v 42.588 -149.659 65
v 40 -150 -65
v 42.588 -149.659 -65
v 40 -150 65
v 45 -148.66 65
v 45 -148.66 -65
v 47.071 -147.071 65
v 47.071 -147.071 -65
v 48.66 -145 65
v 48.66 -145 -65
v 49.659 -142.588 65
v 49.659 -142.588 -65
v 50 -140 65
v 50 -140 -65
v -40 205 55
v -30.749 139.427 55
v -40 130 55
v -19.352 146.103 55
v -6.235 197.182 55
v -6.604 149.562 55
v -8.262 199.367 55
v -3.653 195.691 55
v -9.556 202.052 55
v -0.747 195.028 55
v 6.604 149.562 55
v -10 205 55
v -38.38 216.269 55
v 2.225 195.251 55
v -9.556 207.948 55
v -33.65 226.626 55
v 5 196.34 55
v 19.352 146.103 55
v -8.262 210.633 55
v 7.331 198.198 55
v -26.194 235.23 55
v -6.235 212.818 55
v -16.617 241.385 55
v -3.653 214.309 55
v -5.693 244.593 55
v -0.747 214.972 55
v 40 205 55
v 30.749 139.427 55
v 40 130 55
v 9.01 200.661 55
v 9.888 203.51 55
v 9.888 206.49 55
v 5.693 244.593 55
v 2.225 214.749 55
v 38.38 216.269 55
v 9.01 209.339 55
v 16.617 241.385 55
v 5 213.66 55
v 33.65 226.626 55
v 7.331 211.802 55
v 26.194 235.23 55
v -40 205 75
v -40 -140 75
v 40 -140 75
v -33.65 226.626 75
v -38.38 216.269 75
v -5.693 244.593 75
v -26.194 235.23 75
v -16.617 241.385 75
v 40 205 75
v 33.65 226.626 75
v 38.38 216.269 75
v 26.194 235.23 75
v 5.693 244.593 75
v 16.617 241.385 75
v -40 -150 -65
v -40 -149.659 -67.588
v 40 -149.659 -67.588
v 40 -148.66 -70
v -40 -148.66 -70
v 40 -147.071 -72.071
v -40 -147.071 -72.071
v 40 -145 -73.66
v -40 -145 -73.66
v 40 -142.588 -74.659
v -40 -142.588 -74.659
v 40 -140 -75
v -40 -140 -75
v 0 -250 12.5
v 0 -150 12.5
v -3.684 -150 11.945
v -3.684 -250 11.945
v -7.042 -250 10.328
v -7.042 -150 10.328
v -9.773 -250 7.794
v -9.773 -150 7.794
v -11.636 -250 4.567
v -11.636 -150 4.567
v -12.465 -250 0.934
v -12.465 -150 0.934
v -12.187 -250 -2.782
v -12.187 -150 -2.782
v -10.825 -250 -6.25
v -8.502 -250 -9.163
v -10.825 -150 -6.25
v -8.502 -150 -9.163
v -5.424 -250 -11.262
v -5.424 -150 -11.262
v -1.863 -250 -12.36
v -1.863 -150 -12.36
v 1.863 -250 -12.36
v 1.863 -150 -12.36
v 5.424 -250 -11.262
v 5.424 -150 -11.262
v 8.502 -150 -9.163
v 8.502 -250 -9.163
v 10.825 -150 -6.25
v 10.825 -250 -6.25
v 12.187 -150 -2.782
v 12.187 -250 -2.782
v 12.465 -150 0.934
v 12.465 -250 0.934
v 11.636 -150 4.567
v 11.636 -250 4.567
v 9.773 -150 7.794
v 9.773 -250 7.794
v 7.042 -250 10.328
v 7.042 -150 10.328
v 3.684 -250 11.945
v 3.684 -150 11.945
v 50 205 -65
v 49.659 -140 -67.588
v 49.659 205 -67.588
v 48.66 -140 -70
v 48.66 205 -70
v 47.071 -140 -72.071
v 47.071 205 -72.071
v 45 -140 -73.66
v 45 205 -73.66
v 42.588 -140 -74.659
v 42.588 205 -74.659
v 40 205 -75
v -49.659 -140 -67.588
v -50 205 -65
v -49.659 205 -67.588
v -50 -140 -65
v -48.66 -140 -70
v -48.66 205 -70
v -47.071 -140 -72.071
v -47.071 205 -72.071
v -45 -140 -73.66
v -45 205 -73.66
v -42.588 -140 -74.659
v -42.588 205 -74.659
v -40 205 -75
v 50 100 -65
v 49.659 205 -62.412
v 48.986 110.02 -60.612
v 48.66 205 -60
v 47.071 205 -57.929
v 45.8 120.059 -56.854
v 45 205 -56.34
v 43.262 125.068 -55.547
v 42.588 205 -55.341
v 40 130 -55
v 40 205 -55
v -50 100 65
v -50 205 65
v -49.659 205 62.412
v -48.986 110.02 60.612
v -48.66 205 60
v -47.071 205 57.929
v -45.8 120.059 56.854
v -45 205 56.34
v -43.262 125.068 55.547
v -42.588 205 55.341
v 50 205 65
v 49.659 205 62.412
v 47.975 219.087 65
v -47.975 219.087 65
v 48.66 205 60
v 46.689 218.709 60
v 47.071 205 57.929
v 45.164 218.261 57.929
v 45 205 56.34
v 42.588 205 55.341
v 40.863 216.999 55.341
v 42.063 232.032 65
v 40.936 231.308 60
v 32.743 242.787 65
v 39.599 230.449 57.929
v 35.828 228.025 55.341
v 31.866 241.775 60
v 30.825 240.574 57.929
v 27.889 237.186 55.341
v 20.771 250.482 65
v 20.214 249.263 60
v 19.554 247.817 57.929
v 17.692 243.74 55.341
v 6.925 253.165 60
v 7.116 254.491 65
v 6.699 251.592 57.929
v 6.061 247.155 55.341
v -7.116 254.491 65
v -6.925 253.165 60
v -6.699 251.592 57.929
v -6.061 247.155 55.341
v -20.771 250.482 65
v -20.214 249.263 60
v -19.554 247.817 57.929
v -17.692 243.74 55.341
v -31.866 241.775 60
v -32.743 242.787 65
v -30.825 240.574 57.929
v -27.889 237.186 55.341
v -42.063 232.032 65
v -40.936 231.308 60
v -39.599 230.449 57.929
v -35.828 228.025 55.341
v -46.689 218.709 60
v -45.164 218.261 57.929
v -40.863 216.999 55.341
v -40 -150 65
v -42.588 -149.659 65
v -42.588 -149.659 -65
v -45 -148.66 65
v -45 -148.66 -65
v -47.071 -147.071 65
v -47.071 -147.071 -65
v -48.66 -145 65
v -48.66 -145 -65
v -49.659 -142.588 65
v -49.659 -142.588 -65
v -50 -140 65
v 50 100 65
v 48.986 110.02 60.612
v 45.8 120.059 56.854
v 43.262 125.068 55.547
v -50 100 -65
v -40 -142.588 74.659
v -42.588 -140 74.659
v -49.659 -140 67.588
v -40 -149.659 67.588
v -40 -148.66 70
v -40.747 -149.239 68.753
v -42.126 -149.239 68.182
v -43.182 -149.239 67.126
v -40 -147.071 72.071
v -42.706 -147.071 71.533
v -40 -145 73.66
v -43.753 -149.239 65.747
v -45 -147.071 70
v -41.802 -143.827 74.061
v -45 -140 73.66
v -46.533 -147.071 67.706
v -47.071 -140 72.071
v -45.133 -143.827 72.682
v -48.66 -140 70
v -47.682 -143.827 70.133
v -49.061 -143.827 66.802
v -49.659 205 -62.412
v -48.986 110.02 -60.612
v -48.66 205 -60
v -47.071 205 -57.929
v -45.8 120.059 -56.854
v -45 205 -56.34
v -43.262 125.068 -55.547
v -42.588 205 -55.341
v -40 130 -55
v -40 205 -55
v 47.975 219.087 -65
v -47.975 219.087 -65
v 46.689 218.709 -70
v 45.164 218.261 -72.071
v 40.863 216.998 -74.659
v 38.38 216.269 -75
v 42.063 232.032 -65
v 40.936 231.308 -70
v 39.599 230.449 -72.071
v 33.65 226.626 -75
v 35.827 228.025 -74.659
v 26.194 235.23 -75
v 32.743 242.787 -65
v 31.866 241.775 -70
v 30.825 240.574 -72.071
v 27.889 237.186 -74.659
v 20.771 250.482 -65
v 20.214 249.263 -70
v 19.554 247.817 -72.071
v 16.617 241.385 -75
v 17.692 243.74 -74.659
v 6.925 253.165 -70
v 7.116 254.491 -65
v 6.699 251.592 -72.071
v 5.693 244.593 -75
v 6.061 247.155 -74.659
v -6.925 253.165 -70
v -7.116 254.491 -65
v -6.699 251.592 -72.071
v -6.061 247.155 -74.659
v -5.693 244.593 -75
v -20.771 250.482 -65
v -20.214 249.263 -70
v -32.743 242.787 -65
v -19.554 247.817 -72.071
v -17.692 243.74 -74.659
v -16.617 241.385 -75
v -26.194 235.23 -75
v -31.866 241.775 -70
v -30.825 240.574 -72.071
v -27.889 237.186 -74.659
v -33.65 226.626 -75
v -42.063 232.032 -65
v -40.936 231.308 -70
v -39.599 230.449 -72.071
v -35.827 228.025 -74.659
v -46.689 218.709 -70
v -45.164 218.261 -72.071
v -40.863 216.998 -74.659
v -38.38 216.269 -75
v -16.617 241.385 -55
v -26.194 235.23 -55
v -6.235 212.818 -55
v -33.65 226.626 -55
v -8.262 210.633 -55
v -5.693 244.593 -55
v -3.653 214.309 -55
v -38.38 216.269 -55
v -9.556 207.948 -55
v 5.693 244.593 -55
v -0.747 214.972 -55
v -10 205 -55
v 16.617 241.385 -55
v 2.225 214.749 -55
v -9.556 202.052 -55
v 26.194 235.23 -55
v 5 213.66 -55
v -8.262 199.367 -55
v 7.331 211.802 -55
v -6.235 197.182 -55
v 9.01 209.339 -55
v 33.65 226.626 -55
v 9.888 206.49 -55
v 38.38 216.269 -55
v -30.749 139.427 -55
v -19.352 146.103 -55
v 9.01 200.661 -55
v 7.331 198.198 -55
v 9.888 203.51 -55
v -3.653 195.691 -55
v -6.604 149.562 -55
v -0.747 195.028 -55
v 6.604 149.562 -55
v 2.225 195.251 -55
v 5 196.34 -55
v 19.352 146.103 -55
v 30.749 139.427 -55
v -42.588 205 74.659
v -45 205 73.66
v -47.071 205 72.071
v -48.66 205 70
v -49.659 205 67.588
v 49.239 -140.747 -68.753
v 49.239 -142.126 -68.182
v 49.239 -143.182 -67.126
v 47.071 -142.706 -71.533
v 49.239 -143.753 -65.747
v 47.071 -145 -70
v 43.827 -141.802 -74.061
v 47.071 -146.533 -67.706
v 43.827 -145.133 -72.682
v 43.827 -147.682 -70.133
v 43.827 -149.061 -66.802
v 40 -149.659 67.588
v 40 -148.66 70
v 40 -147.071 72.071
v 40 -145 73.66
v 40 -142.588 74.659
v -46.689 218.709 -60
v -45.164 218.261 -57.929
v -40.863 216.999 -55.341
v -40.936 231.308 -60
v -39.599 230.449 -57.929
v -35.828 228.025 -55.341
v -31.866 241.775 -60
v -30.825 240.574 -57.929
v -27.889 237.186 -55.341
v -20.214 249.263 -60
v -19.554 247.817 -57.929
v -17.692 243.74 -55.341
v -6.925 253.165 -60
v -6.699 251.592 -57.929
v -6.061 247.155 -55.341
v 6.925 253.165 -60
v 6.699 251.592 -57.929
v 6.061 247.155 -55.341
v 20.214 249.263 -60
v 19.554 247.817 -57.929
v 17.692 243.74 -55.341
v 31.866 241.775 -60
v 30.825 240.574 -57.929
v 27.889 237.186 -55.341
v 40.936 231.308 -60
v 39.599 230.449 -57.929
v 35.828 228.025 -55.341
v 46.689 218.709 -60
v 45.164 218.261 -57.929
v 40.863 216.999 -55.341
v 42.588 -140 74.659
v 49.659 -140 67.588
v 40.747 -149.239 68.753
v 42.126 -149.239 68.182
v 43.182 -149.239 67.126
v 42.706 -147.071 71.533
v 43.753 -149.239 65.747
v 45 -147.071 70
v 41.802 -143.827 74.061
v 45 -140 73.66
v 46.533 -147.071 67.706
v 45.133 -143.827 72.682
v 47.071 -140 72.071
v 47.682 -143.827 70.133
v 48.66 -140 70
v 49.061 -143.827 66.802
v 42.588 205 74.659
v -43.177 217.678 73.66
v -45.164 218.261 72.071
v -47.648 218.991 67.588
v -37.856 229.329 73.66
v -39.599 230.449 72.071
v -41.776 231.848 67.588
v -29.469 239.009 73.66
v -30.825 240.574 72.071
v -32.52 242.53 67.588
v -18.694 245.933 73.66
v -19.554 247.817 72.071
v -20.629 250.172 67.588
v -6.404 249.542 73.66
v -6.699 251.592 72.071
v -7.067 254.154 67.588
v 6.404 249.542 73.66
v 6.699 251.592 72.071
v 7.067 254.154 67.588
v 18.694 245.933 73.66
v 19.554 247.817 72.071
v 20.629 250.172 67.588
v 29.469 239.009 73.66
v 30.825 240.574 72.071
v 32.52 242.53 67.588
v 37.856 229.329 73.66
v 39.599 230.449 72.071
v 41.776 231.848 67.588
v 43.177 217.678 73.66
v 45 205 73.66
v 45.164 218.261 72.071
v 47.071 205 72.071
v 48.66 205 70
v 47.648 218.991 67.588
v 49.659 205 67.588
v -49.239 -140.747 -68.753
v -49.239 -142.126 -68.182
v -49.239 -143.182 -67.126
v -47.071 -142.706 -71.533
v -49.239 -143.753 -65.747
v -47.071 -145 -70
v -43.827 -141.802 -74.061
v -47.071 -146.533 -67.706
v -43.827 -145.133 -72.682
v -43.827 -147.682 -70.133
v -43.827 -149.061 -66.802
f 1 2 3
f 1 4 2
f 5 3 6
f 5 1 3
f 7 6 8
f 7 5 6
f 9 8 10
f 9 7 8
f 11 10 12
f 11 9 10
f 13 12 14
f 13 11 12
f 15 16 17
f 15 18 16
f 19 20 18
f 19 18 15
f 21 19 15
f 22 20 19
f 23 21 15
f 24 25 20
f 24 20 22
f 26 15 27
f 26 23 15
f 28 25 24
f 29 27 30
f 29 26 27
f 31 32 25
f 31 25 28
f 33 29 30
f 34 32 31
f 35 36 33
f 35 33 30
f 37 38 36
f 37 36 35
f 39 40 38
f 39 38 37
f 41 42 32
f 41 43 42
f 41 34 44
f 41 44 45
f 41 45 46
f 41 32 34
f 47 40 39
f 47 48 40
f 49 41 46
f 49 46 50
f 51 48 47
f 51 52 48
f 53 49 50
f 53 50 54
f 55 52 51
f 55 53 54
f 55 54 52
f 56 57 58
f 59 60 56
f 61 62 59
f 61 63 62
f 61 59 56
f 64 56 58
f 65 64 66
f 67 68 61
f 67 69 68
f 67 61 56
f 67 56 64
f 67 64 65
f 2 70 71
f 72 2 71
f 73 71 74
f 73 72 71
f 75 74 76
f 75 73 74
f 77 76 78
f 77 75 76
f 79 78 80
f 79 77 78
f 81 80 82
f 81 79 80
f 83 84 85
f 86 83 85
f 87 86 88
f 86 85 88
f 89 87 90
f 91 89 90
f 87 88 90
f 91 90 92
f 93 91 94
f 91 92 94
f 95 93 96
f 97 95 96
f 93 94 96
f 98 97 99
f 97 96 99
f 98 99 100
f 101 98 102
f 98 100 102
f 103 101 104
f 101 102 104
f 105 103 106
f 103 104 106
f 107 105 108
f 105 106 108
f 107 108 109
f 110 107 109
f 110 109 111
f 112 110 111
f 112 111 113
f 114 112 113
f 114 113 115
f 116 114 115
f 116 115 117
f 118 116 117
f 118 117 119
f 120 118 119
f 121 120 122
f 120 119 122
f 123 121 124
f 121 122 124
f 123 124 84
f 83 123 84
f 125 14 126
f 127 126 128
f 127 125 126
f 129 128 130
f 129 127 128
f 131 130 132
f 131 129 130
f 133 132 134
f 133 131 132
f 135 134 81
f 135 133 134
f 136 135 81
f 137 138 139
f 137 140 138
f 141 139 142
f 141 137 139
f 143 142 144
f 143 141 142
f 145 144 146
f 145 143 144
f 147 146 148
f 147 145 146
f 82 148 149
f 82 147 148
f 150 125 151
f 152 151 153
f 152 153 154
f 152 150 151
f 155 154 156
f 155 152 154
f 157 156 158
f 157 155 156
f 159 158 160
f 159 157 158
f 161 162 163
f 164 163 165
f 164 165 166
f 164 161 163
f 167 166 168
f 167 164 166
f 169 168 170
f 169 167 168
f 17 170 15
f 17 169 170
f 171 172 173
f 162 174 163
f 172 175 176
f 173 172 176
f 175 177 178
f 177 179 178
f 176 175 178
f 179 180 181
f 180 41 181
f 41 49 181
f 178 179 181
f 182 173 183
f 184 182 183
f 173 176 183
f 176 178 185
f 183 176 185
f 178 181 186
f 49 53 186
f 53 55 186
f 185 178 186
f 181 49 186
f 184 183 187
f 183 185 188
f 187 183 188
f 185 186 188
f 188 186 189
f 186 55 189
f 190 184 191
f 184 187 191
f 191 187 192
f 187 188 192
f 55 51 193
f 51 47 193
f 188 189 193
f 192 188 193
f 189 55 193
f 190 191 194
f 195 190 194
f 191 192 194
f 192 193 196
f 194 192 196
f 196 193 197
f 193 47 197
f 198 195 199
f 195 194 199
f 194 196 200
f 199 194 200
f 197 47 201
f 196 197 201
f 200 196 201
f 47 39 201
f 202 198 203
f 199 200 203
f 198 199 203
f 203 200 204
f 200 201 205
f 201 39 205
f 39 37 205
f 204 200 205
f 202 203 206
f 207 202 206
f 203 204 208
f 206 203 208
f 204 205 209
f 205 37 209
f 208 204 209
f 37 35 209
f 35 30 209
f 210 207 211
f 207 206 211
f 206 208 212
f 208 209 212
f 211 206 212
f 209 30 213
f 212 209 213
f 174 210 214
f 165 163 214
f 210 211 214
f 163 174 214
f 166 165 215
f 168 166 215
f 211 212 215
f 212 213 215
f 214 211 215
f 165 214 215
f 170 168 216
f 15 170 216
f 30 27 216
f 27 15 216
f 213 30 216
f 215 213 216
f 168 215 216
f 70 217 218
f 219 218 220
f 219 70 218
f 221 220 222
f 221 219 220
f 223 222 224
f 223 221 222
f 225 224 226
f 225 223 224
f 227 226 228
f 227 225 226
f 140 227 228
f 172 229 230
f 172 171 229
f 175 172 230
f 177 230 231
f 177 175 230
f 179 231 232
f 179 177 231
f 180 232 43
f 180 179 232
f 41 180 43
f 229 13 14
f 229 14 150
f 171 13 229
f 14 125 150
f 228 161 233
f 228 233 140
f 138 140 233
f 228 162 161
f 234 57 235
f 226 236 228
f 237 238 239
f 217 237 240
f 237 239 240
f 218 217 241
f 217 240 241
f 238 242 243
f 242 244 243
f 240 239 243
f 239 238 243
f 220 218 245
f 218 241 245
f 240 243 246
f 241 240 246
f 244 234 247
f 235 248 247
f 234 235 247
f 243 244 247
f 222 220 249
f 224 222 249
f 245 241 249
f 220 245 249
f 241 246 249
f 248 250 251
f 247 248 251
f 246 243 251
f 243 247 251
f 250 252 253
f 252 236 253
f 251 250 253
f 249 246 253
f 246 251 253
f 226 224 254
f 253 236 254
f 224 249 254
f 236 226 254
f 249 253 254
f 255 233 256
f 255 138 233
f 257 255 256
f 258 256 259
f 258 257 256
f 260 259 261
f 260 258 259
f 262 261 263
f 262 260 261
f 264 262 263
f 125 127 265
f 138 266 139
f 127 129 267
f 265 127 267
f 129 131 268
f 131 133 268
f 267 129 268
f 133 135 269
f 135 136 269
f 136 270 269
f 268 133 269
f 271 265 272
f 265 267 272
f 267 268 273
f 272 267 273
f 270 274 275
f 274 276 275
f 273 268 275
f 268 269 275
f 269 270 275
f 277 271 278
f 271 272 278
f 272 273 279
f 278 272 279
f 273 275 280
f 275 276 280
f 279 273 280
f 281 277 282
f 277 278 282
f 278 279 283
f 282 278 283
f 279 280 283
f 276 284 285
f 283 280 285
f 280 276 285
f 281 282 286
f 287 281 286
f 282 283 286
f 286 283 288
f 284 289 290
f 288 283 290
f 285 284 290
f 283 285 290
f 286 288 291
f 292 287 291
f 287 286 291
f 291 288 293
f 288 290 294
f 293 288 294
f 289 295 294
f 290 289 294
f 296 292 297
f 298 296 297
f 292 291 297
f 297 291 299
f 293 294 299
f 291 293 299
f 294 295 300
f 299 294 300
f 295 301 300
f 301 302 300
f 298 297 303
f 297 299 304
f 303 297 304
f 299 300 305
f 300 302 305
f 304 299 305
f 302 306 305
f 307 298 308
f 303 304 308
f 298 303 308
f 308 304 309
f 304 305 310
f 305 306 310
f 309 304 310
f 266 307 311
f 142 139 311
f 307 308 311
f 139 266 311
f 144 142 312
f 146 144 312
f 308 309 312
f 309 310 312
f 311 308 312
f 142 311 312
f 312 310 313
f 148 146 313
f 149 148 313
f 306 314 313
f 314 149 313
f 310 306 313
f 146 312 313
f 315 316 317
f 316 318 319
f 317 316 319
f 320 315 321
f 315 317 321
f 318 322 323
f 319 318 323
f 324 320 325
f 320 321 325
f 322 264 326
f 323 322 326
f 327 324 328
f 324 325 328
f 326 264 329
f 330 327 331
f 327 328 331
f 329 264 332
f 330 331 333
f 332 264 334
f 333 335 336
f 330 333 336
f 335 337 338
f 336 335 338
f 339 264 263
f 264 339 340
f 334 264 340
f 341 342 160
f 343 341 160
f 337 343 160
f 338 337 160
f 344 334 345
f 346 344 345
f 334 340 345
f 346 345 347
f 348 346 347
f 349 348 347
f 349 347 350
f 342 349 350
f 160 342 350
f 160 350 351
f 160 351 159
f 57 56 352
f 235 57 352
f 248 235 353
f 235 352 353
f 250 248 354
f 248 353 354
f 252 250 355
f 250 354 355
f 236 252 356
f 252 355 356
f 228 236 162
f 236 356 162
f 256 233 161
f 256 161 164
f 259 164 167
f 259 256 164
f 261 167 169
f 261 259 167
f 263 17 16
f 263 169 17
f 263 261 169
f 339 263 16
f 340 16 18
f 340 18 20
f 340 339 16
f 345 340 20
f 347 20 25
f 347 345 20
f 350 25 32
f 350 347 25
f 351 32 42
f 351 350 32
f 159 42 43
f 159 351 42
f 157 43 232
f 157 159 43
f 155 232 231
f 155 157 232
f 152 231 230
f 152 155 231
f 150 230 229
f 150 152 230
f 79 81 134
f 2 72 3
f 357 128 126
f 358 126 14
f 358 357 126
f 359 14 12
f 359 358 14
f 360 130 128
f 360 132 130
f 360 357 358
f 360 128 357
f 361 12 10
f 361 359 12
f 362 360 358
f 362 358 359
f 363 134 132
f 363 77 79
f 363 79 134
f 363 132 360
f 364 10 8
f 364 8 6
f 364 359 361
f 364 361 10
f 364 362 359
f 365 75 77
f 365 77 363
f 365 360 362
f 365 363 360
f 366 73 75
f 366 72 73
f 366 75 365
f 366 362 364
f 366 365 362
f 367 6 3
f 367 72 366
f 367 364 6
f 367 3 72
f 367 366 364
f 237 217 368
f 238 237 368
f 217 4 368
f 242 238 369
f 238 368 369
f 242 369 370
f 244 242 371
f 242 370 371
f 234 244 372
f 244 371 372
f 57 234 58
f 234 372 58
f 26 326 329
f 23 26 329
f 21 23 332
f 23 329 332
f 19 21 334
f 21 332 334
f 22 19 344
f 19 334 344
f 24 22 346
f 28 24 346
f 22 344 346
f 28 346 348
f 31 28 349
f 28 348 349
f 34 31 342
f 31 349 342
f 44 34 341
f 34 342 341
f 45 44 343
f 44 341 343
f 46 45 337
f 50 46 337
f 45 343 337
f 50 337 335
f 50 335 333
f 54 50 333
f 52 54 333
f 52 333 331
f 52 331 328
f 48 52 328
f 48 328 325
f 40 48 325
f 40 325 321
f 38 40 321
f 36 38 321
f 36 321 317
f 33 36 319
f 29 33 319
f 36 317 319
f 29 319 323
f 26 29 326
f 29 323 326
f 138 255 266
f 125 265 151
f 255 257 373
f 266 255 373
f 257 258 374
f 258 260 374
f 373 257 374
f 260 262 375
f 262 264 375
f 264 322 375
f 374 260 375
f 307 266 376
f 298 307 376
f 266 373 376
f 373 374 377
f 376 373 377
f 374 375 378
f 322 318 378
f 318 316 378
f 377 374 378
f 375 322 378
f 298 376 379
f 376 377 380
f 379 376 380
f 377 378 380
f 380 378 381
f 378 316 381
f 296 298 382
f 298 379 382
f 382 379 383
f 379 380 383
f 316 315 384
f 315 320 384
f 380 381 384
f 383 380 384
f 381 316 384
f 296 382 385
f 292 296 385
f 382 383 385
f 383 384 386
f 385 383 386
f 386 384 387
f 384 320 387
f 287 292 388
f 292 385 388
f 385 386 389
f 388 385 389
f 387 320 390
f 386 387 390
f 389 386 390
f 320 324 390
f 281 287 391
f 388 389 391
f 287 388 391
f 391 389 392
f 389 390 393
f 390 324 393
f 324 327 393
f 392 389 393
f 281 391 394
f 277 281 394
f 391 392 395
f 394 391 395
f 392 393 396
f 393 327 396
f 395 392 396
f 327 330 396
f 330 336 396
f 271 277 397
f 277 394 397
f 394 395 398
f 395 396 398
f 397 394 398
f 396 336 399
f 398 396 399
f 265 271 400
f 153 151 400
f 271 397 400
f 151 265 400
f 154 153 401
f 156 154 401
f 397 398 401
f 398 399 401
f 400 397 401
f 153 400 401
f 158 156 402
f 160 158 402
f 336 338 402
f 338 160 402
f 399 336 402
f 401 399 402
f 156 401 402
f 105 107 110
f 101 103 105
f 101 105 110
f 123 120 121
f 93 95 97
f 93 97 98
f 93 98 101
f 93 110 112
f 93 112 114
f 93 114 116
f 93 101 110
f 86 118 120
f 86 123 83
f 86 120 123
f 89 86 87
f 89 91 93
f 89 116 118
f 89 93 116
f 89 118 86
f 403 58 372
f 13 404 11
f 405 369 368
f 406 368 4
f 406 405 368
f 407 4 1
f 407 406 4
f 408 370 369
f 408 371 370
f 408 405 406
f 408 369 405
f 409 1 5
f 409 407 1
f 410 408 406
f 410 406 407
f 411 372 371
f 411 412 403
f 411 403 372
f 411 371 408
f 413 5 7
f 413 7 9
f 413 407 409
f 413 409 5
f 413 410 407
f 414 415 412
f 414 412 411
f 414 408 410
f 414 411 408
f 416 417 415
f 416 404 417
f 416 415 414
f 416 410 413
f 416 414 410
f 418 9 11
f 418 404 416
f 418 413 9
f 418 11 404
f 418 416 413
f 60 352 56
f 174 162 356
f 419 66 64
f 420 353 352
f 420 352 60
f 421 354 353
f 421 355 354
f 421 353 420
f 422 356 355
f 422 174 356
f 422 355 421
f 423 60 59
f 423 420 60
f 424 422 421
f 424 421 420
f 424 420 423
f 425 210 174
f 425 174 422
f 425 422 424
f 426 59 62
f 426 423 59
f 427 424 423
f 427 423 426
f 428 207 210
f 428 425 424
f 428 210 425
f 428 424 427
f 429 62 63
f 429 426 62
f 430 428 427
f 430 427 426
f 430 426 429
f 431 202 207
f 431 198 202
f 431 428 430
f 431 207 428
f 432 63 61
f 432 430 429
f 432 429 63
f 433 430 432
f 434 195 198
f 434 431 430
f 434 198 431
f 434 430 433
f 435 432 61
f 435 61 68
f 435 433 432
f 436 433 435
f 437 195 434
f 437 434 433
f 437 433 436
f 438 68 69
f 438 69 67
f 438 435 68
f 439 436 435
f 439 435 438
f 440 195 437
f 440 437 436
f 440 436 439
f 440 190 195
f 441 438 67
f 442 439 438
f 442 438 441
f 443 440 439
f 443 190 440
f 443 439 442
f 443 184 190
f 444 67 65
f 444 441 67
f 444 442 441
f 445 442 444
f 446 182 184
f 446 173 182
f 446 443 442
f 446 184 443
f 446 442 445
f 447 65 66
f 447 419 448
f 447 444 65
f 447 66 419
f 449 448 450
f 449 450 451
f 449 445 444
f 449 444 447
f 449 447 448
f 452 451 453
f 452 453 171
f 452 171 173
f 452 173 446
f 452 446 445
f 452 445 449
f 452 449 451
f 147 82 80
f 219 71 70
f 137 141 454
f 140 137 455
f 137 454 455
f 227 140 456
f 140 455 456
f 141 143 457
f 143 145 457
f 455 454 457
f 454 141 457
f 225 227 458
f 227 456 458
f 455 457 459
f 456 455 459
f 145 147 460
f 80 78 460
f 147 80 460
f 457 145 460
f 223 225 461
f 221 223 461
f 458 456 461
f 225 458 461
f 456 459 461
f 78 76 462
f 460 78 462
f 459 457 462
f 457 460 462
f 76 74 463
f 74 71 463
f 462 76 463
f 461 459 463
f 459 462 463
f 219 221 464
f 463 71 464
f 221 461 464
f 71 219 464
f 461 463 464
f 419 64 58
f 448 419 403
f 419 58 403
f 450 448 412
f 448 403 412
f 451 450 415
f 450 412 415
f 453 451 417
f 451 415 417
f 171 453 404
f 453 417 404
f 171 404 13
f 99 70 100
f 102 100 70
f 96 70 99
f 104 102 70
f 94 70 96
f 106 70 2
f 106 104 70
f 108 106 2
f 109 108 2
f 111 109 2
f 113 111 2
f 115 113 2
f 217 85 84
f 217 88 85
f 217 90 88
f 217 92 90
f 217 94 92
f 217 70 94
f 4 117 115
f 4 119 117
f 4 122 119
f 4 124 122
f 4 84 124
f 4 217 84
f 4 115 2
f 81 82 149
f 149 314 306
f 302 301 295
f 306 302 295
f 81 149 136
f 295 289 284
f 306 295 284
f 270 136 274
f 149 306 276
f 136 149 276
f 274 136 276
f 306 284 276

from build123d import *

# Parameters (mm, degrees)
SKETCH2_W           = 100
SKETCH2_H           = 300
BOSS_EXTRUDE1_DEPTH = 75
CUT_EXTRUDE1_REACH  = 422.463
CUT_EXTRUDE1_START  = 150
SKETCH3_W           = 100
SKETCH3_H           = 110
SKETCH4_R           = 10
BOSS_EXTRUDE2_DEPTH = 110
SKETCH5_R           = 12.5
BOSS_EXTRUDE3_DEPTH = 100
FILLET1_RADIUS      = 50
FILLET1_LENGTH      = 110
FILLET2_R           = 10
FILLET3_R           = 10


with BuildPart() as part:
    # Sketch2 → Boss-Extrude1 (new, symmetric)
    with BuildSketch(Plane.XY):
        Rectangle(SKETCH2_W, SKETCH2_H)
        with BuildLine():
            ThreePointArc((-50, 205), (0, 255), (50, 205))
            Line((50, 205), (50, 150))
            Line((50, 150), (-50, 150))
            Line((-50, 150), (-50, 205))
        make_face()
    extrude(amount=BOSS_EXTRUDE1_DEPTH, both=True)

    # Sketch3 → Cut-Extrude1 (cut, up to next)
    with BuildSketch(Plane(origin=(0, 0, 0), x_dir=(1, 0, 0), z_dir=(0, 1, 0)).offset(CUT_EXTRUDE1_START), mode=Mode.PRIVATE) as cut_extrude1_sk1:
        Rectangle(SKETCH3_W, SKETCH3_H)
    cut_extrude1_tool1 = extrude(cut_extrude1_sk1.sketch, amount=CUT_EXTRUDE1_REACH, mode=Mode.PRIVATE) & part.part
    add(cut_extrude1_tool1.solids().sort_by_distance((0, 150, 0))[0], mode=Mode.SUBTRACT)

    # Sketch4 → Boss-Extrude2 (add)
    with BuildSketch(Plane.XY.offset(-55)):
        with Locations(Location((0, 205, 0), (0, 0, 180))):
            Circle(SKETCH4_R)
    extrude(amount=BOSS_EXTRUDE2_DEPTH)

    # Sketch5 → Boss-Extrude3 (add)
    with BuildSketch(Plane.XZ.offset(150)):
        with Locations(Location((0, 0, 0), (0, 0, 90))):
            Circle(SKETCH5_R)
    extrude(amount=BOSS_EXTRUDE3_DEPTH)

    # Fillet1: full round fillet: the end face becomes a half cylinder, R = half its width
    fillet1_face = Plane((0, 150, 0), x_dir=(0, 0, -1), z_dir=(0, 1, 0))  # on the end face: x along it, z out of the body
    fillet1_slab = fillet1_face.offset(-FILLET1_RADIUS / 2) * Box(FILLET1_LENGTH, 2 * FILLET1_RADIUS, FILLET1_RADIUS, mode=Mode.PRIVATE)  # the body's end, R deep
    fillet1_round = Plane((0, 100, 0), x_dir=(0, 1, 0), z_dir=(0, 0, -1)) * Cylinder(FILLET1_RADIUS, FILLET1_LENGTH, mode=Mode.PRIVATE)  # its axis R under the face
    add(fillet1_slab - fillet1_round, mode=Mode.SUBTRACT)

    # Fillet2
    fillet2_edges = [part.edges().sort_by_distance(p)[0] for p in [
        (0, 255, 75),
        (-50, 27.5, 75),
        (0, -150, 75),
        (50, 27.5, 75),
        (0, -150, -75),
        (-50, 27.5, -75),
        (0, 255, -75),
        (50, 27.5, -75),
        (50, -150, 0),
        (-50, -150, 0),
    ]]
    fillet(fillet2_edges, radius=FILLET2_R)

    # Fillet3
    fillet3_edges = [part.edges().sort_by_distance(p)[0] for p in [
        (50, 152.5, 55),
        (0, 255, 55),
        (50, 152.5, -55),
        (0, 255, -55),
        (-50, 152.5, 55),
        (-50, 152.5, -55),
    ]]
    fillet(fillet3_edges, radius=FILLET3_R - 0.0001)  # a hair under: the kernel refuses the full size


solid = part.part
